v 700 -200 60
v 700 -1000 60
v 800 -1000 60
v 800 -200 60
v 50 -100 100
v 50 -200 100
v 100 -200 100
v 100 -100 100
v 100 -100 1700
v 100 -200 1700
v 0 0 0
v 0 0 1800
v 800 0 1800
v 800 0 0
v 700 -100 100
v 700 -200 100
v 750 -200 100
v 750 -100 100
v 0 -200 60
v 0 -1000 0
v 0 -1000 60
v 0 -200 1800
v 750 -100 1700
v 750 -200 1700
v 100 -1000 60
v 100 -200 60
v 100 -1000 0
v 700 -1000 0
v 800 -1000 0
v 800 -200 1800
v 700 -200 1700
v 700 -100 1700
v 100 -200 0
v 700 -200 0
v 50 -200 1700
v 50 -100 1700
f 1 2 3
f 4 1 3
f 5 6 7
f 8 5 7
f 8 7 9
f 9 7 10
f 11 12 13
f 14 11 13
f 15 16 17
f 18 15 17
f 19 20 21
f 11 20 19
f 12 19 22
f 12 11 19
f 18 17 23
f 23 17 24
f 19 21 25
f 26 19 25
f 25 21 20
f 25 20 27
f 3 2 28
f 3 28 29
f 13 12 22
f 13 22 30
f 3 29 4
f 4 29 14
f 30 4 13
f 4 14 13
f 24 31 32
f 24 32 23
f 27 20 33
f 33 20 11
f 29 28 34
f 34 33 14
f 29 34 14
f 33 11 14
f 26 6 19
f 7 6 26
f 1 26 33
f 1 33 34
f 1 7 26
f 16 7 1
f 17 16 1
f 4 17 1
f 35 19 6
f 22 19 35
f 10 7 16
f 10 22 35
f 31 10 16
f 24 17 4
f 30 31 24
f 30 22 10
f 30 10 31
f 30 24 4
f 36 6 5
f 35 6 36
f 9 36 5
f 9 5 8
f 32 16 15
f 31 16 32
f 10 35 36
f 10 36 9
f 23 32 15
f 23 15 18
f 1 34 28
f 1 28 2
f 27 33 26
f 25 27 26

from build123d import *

# Parameters (mm, degrees)
F0_W     = 800
F0_H     = 1800
F1_DEPTH = 200
F3_W     = 50
F3_H     = 1600
F4_DEPTH = 100
F5_W     = 100
F5_H     = 60
F6_DEPTH = 800


with BuildPart() as f1:
    # F0 (on Front) → F1 (new body)
    with BuildSketch(Plane.XZ):
        with Locations((400, 900)):
            Rectangle(F0_W, F0_H)
    extrude(amount=F1_DEPTH)

    # F3 (on face) → F4 (cut)
    with BuildSketch(Plane.XZ.offset(200)):
        with Locations((75, 900)):
            Rectangle(F3_W, F3_H)
        with Locations((725, 900)):
            Rectangle(F3_W, F3_H)
    extrude(amount=-F4_DEPTH, mode=Mode.SUBTRACT)

    # F5 (on face) → F6 (join)
    with BuildSketch(Plane.XZ.offset(200)):
        with Locations((50, 30)):
            Rectangle(F5_W, F5_H)
        with Locations((750, 30)):
            Rectangle(F5_W, F5_H)
    extrude(amount=F6_DEPTH)


solid = f1.part
